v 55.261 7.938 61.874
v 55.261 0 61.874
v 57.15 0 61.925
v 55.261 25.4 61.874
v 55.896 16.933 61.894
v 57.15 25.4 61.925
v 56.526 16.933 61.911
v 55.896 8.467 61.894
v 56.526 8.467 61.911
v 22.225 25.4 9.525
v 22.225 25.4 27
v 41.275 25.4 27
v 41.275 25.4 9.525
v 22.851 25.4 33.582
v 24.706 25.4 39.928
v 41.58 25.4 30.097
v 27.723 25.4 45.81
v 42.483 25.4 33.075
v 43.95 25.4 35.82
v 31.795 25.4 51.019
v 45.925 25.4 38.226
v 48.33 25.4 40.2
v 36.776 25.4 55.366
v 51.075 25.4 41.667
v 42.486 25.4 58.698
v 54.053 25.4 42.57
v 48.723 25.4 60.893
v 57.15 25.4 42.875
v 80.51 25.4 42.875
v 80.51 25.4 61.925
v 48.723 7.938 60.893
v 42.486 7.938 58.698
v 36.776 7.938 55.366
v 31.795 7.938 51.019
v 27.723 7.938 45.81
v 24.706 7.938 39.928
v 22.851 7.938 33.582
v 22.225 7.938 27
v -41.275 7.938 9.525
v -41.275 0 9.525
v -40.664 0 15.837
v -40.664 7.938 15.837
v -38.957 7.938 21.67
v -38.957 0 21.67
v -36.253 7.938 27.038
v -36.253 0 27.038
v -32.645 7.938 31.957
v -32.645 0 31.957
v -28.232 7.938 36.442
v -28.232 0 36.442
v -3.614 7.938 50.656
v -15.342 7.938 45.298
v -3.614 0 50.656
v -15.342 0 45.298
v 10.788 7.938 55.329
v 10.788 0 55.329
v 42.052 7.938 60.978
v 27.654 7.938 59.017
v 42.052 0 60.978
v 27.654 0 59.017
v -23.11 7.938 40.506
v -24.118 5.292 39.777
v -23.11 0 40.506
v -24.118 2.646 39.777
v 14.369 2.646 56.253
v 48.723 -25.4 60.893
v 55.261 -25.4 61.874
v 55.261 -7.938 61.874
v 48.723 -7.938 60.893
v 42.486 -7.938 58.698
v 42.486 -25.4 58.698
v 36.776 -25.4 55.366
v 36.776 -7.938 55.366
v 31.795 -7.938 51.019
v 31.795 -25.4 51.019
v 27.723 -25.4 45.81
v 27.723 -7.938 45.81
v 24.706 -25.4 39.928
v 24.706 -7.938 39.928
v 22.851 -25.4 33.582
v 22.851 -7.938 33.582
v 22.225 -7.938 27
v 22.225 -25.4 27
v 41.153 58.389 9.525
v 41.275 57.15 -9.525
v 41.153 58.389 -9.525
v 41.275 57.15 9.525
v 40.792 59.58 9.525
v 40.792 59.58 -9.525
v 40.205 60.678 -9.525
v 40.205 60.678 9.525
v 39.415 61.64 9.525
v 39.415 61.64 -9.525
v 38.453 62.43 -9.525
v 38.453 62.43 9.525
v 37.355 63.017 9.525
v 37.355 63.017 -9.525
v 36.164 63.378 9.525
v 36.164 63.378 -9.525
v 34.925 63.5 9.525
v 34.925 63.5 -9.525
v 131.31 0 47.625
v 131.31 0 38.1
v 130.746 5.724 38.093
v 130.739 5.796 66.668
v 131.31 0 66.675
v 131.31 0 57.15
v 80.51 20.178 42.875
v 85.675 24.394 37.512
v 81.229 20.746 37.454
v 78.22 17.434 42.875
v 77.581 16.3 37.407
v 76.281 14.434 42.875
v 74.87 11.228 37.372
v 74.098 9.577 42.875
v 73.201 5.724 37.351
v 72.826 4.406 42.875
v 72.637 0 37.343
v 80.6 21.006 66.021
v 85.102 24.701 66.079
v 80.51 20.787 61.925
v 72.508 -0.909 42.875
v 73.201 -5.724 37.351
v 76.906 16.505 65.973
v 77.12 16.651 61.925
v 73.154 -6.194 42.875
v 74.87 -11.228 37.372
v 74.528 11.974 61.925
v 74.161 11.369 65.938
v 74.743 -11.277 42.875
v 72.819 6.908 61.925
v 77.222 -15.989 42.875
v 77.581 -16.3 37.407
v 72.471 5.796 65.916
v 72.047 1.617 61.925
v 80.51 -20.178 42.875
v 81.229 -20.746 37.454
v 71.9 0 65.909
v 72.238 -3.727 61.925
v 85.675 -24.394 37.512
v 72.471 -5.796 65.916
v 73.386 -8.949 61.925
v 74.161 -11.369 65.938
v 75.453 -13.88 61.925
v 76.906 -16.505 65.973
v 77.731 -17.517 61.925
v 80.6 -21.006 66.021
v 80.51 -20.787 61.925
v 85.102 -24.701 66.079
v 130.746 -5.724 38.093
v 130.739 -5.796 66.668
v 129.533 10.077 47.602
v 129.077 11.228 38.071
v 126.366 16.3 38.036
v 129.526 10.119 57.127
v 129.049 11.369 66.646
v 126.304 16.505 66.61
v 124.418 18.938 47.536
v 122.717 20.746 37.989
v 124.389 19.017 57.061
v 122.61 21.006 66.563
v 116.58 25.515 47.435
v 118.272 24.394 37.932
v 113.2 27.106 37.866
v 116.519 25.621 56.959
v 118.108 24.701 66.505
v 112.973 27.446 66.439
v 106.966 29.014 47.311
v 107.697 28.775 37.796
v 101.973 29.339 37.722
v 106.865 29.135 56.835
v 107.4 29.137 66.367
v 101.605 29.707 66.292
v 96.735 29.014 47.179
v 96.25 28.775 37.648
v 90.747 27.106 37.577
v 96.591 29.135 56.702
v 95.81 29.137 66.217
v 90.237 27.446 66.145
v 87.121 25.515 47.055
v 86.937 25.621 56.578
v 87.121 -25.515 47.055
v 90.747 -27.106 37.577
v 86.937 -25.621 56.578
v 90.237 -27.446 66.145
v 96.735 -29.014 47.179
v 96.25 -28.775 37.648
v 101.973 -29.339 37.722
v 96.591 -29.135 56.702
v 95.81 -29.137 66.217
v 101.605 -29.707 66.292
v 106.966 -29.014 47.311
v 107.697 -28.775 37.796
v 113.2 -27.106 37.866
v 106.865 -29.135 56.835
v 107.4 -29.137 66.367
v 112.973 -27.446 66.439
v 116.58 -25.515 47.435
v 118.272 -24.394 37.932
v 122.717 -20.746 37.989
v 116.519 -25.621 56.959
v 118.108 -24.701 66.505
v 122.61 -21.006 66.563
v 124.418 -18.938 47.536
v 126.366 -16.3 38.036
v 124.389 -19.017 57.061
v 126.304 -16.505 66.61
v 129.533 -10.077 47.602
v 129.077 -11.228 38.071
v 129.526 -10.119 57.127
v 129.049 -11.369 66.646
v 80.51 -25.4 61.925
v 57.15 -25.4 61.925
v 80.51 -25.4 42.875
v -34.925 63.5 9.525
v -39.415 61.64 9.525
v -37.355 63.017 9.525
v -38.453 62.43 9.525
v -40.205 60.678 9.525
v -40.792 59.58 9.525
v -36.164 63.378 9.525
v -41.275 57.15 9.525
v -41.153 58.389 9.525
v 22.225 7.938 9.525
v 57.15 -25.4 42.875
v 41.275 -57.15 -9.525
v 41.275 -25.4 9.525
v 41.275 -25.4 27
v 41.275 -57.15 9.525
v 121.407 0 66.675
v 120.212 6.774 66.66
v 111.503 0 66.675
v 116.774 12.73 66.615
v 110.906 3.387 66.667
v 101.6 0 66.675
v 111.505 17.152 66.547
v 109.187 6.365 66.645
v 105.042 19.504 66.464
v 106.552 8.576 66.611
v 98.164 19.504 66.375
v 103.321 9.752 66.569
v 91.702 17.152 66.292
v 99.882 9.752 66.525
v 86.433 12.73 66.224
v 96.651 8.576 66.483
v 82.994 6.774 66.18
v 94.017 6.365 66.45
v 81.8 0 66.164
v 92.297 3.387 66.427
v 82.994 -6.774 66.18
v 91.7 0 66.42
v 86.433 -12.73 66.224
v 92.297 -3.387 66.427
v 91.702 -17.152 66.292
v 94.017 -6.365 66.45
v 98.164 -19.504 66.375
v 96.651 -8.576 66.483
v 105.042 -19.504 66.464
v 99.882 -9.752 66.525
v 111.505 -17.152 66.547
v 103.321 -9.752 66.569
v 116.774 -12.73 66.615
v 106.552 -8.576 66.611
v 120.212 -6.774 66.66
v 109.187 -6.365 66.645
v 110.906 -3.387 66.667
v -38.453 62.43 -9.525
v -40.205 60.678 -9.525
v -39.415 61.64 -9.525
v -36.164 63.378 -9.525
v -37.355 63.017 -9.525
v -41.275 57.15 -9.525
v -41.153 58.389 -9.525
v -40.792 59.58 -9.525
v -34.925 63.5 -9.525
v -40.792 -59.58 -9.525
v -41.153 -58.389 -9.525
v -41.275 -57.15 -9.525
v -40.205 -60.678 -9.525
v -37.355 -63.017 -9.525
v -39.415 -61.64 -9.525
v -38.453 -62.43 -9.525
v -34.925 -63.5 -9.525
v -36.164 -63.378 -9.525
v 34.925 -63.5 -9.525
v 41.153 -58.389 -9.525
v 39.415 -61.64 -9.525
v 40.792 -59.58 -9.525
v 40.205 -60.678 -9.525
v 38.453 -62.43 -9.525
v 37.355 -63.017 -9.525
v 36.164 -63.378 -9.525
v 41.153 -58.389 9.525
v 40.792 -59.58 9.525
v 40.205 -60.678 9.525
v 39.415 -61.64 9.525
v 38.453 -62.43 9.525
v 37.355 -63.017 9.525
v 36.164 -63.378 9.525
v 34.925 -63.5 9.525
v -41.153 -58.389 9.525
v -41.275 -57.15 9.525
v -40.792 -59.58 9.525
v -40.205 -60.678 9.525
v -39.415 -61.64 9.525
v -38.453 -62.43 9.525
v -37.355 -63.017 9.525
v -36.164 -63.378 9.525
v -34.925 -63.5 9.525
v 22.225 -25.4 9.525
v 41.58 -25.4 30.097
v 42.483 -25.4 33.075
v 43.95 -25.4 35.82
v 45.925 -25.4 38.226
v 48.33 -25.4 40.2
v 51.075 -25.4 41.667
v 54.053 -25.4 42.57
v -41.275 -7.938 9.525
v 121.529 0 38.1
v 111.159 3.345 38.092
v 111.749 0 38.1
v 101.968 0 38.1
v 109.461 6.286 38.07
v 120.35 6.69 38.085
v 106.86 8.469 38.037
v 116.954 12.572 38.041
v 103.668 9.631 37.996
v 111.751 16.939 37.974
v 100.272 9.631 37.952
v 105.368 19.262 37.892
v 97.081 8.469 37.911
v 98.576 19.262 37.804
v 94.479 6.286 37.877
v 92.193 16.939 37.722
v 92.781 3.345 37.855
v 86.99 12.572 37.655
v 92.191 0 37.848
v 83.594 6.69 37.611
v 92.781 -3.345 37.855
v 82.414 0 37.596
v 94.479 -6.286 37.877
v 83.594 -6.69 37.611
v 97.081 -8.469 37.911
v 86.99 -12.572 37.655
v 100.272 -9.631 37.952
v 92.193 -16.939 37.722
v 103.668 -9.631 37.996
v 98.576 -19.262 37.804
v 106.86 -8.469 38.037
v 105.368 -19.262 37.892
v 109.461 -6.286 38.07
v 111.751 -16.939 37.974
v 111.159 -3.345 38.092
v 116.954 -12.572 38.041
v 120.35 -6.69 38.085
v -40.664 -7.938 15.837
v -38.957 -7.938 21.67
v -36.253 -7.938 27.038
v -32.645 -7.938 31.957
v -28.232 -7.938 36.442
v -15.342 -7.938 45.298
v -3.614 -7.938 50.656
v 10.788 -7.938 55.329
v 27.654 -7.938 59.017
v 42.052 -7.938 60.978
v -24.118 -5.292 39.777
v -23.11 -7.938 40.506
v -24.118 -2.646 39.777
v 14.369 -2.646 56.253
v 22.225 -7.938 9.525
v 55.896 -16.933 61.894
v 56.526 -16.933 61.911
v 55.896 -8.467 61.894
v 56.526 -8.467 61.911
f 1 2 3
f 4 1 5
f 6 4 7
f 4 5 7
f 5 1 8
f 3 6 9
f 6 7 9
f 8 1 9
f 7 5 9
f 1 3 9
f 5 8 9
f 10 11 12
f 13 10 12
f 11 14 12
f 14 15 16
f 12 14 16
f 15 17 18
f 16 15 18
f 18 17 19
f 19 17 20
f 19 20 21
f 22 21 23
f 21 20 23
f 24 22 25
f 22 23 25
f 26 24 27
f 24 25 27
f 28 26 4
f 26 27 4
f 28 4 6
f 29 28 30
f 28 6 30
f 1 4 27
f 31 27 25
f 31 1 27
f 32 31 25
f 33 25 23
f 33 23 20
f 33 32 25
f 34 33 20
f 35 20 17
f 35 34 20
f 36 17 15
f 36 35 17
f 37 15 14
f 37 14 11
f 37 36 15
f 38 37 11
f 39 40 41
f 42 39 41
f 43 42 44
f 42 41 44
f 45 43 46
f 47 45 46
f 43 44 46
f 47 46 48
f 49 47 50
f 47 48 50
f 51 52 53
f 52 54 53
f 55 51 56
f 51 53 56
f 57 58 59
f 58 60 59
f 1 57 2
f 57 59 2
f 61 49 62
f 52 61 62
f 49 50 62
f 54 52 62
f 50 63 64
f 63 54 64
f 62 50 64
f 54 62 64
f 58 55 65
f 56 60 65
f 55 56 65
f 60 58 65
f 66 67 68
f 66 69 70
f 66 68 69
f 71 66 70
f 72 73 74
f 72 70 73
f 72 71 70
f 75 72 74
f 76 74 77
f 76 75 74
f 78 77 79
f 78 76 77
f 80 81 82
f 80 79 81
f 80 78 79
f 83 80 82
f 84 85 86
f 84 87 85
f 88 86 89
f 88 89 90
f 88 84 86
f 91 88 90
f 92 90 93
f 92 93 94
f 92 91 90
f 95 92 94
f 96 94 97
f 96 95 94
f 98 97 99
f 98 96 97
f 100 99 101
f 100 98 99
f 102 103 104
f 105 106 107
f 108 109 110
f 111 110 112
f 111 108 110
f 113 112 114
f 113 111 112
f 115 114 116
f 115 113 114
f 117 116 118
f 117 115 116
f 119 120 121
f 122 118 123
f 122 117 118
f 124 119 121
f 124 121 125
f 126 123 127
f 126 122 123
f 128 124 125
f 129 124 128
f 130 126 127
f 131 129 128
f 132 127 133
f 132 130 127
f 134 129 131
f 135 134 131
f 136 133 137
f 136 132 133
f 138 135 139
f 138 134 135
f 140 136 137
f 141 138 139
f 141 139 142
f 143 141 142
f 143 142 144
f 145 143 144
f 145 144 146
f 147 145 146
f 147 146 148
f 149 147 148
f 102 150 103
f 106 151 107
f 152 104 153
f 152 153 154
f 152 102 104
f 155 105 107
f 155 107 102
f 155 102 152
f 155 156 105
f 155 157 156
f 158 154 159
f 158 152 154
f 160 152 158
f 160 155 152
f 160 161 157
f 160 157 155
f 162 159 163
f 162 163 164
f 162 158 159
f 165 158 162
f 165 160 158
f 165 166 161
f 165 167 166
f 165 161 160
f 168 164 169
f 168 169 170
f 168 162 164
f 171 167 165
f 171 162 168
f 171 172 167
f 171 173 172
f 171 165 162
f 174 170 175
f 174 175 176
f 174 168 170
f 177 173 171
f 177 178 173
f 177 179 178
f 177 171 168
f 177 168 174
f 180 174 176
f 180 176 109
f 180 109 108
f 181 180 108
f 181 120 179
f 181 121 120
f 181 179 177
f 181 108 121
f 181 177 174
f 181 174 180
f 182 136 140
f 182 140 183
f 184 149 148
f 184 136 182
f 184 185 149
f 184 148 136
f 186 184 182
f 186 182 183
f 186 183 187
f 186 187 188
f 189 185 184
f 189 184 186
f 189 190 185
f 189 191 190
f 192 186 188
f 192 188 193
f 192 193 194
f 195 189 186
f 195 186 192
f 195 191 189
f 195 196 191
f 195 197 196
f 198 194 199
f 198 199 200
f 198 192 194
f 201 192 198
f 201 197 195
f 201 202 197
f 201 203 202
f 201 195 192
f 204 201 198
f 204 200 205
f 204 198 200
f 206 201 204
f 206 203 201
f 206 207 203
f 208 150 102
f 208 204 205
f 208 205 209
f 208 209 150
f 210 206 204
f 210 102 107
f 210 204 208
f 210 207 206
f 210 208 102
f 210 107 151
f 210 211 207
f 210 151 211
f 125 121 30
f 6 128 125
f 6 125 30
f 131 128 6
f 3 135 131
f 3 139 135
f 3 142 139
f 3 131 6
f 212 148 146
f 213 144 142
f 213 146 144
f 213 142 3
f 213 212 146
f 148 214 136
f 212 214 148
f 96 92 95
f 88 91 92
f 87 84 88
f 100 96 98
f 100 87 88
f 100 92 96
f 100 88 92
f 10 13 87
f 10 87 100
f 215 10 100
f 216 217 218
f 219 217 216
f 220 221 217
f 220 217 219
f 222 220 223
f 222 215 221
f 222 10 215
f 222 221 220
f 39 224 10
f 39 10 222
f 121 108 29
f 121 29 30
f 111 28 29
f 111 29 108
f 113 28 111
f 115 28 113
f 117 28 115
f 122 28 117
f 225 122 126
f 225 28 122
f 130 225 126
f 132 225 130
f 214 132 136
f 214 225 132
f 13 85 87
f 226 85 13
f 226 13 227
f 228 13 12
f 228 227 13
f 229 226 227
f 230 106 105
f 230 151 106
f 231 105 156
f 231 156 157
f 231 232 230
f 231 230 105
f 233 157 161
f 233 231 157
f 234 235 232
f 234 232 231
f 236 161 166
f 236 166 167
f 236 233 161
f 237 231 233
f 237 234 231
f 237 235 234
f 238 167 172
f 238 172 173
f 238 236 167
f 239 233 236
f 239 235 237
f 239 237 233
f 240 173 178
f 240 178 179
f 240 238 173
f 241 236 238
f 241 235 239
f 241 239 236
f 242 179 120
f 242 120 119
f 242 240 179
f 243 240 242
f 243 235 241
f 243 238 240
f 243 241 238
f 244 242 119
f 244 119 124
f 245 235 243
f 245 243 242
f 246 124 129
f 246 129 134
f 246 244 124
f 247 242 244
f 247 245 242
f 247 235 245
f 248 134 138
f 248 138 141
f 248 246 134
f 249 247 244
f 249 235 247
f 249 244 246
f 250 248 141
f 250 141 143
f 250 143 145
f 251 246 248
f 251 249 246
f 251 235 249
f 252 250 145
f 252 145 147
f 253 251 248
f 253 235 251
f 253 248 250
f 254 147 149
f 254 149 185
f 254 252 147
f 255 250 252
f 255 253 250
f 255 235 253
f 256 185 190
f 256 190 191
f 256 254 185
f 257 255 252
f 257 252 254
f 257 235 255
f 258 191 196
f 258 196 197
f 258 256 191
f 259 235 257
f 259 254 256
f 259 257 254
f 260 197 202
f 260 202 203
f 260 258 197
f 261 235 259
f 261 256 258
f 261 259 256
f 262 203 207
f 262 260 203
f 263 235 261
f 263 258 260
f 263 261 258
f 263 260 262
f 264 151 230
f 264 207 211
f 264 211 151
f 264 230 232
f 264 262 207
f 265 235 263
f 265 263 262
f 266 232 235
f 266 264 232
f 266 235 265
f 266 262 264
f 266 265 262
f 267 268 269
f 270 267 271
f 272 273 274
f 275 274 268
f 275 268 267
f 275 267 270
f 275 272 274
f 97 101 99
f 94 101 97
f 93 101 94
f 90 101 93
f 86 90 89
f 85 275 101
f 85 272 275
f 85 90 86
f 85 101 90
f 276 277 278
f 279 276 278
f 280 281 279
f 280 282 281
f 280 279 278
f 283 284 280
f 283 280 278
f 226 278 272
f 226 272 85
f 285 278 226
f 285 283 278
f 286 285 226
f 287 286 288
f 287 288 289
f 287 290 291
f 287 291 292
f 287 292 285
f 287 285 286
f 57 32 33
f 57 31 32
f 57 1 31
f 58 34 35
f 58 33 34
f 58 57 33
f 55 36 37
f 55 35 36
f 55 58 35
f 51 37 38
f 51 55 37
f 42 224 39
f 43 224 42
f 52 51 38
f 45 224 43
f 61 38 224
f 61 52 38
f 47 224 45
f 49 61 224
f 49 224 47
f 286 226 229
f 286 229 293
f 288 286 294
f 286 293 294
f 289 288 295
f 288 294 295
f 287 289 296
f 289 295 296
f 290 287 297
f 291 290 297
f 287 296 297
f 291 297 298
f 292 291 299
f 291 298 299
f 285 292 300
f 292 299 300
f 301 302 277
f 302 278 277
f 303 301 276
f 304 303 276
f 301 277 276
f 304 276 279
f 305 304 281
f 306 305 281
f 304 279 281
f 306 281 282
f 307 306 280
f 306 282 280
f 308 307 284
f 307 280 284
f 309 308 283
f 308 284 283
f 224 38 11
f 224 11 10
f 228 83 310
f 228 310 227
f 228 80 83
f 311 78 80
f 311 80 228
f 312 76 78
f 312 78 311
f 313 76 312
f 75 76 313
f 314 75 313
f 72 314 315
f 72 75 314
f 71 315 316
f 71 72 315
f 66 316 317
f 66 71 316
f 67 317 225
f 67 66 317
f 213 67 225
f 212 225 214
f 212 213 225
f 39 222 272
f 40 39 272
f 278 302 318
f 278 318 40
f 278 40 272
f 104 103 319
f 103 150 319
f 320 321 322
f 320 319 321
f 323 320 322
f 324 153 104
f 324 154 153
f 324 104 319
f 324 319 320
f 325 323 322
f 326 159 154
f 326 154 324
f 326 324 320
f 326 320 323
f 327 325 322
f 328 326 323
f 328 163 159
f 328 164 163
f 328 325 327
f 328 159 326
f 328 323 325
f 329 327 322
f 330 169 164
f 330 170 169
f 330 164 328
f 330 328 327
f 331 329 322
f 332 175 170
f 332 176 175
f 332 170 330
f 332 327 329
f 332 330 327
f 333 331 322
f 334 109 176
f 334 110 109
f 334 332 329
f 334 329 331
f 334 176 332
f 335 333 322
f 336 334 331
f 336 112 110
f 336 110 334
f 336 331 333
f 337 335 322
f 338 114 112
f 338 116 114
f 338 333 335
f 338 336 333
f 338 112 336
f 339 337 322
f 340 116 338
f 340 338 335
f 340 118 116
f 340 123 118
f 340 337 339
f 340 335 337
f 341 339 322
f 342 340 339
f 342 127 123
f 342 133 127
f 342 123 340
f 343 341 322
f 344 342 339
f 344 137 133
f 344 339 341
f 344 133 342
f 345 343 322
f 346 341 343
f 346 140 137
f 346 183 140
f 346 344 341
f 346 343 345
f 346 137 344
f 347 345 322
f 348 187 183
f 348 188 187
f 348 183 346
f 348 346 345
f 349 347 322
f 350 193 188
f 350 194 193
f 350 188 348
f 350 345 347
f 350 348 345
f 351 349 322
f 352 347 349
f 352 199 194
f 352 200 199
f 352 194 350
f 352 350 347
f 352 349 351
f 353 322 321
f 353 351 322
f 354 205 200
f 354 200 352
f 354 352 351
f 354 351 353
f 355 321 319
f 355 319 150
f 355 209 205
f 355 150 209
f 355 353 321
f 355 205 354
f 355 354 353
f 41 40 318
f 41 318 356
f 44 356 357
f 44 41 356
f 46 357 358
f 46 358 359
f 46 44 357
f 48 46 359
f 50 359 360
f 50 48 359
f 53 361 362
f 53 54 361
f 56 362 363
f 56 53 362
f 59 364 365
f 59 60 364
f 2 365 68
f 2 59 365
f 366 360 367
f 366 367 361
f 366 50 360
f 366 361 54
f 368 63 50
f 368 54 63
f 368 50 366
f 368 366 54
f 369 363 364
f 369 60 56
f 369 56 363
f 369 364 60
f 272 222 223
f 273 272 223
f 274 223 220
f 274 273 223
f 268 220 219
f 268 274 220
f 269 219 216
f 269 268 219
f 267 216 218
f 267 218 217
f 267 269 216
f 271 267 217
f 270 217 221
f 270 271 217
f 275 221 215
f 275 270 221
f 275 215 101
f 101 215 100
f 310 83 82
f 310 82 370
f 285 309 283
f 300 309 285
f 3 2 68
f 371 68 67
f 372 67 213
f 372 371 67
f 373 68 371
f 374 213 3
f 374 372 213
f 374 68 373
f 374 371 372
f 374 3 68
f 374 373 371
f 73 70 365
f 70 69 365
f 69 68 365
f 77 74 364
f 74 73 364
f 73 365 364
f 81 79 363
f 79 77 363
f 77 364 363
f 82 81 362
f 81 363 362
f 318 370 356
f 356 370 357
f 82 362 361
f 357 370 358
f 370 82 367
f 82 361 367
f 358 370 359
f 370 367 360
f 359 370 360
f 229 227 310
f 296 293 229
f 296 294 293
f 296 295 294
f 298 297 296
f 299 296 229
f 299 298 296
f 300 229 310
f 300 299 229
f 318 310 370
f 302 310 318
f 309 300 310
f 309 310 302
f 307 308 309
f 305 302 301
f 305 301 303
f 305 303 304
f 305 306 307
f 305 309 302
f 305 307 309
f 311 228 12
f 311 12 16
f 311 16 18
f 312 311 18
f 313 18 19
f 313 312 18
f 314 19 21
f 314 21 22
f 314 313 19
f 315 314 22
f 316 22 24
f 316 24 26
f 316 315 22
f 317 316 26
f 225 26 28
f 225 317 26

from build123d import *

# Parameters (mm, degrees)
F1_DEPTH = 63.5
F2_DEPTH = 25.4
F3_DEPTH = 7.9375
F5_R     = 6.35


with BuildPart() as f1:
    # F0 (on Front) → F1 (new body, symmetric)
    with BuildSketch(Plane.XZ):
        Polygon((22.225, 9.525), (-41.275, 9.525), (-41.275, -9.525), (41.275, -9.525), (41.275, 9.525), align=None)
    extrude(amount=F1_DEPTH, both=True)

    # F0 (on Front) → F2 (join, symmetric)
    with BuildSketch(Plane.XZ):
        with BuildLine():
            Line((22.225, 27.0002), (22.225, 9.525))
            Line((22.225, 9.525), (41.275, 9.525))
            Line((41.275, 9.525), (41.275, 27.0002))
            ThreePointArc((41.275, 27.0002), (45.9246798487, 38.2255201513), (57.15, 42.8752))
            Line((57.15, 42.8752), (80.509888177, 42.8752))
            Line((80.509888177, 42.8752), (80.509888177, 61.9252))
            Line((80.509888177, 61.9252), (57.15, 61.9252))
            add(Edge.make_bspline(
                [(55.2606607544, 61.8740587228), (55.8984719216, 61.8948615926), (56.5284123731, 61.9118838852), (57.15, 61.9252)],
                knots=[109.5520326142, 109.5520326142, 109.5520326142, 109.5520326142, 111.5045361635, 111.5045361635, 111.5045361635, 111.5045361635], degree=3))
            ThreePointArc((55.2606607544, 61.8740587228), (31.7951109433, 51.0186351265), (22.225, 27.0002))
        make_face()
    extrude(amount=F2_DEPTH, both=True)

    # F0 (on Front) → F3 (join, symmetric)
    with BuildSketch(Plane.XZ):
        with BuildLine():
            add(Edge.make_bspline(
                [(-41.275, 9.525), (-41.0908827839, 47.6377500775), (19.4740370552, 60.7068410375), (55.2606607544, 61.8740587228)],
                knots=[0, 0, 0, 0, 109.5520326142, 109.5520326142, 109.5520326142, 109.5520326142], degree=3))
            Line((-41.275, 9.525), (22.225, 9.525))
            Line((22.225, 9.525), (22.225, 27.0002))
            ThreePointArc((22.225, 27.0002), (31.7951109433, 51.0186351265), (55.2606607544, 61.8740587228))
        make_face()
    extrude(amount=F3_DEPTH, both=True)

    # F0 (on Front) → F4 (revolve)
    with BuildSketch(Plane.XZ):
        Polygon((131.309888177, 66.675), (101.6, 66.675), (101.9684821367, 38.1), (131.309888177, 38.1), align=None)
    revolve(axis=Axis((101.7842410684, 0, 52.3875), (-0.0128941908, 0, 0.9999168665)))

    # F5
    f5_edges = [f1.edges().sort_by_distance(p)[0] for p in [
        (41.275, -63.5, 0),
        (-41.275, -63.5, 0),
        (-41.275, 63.5, 0),
        (41.275, 63.5, 0),
    ]]
    fillet(f5_edges, radius=F5_R)


solid = f1.part
